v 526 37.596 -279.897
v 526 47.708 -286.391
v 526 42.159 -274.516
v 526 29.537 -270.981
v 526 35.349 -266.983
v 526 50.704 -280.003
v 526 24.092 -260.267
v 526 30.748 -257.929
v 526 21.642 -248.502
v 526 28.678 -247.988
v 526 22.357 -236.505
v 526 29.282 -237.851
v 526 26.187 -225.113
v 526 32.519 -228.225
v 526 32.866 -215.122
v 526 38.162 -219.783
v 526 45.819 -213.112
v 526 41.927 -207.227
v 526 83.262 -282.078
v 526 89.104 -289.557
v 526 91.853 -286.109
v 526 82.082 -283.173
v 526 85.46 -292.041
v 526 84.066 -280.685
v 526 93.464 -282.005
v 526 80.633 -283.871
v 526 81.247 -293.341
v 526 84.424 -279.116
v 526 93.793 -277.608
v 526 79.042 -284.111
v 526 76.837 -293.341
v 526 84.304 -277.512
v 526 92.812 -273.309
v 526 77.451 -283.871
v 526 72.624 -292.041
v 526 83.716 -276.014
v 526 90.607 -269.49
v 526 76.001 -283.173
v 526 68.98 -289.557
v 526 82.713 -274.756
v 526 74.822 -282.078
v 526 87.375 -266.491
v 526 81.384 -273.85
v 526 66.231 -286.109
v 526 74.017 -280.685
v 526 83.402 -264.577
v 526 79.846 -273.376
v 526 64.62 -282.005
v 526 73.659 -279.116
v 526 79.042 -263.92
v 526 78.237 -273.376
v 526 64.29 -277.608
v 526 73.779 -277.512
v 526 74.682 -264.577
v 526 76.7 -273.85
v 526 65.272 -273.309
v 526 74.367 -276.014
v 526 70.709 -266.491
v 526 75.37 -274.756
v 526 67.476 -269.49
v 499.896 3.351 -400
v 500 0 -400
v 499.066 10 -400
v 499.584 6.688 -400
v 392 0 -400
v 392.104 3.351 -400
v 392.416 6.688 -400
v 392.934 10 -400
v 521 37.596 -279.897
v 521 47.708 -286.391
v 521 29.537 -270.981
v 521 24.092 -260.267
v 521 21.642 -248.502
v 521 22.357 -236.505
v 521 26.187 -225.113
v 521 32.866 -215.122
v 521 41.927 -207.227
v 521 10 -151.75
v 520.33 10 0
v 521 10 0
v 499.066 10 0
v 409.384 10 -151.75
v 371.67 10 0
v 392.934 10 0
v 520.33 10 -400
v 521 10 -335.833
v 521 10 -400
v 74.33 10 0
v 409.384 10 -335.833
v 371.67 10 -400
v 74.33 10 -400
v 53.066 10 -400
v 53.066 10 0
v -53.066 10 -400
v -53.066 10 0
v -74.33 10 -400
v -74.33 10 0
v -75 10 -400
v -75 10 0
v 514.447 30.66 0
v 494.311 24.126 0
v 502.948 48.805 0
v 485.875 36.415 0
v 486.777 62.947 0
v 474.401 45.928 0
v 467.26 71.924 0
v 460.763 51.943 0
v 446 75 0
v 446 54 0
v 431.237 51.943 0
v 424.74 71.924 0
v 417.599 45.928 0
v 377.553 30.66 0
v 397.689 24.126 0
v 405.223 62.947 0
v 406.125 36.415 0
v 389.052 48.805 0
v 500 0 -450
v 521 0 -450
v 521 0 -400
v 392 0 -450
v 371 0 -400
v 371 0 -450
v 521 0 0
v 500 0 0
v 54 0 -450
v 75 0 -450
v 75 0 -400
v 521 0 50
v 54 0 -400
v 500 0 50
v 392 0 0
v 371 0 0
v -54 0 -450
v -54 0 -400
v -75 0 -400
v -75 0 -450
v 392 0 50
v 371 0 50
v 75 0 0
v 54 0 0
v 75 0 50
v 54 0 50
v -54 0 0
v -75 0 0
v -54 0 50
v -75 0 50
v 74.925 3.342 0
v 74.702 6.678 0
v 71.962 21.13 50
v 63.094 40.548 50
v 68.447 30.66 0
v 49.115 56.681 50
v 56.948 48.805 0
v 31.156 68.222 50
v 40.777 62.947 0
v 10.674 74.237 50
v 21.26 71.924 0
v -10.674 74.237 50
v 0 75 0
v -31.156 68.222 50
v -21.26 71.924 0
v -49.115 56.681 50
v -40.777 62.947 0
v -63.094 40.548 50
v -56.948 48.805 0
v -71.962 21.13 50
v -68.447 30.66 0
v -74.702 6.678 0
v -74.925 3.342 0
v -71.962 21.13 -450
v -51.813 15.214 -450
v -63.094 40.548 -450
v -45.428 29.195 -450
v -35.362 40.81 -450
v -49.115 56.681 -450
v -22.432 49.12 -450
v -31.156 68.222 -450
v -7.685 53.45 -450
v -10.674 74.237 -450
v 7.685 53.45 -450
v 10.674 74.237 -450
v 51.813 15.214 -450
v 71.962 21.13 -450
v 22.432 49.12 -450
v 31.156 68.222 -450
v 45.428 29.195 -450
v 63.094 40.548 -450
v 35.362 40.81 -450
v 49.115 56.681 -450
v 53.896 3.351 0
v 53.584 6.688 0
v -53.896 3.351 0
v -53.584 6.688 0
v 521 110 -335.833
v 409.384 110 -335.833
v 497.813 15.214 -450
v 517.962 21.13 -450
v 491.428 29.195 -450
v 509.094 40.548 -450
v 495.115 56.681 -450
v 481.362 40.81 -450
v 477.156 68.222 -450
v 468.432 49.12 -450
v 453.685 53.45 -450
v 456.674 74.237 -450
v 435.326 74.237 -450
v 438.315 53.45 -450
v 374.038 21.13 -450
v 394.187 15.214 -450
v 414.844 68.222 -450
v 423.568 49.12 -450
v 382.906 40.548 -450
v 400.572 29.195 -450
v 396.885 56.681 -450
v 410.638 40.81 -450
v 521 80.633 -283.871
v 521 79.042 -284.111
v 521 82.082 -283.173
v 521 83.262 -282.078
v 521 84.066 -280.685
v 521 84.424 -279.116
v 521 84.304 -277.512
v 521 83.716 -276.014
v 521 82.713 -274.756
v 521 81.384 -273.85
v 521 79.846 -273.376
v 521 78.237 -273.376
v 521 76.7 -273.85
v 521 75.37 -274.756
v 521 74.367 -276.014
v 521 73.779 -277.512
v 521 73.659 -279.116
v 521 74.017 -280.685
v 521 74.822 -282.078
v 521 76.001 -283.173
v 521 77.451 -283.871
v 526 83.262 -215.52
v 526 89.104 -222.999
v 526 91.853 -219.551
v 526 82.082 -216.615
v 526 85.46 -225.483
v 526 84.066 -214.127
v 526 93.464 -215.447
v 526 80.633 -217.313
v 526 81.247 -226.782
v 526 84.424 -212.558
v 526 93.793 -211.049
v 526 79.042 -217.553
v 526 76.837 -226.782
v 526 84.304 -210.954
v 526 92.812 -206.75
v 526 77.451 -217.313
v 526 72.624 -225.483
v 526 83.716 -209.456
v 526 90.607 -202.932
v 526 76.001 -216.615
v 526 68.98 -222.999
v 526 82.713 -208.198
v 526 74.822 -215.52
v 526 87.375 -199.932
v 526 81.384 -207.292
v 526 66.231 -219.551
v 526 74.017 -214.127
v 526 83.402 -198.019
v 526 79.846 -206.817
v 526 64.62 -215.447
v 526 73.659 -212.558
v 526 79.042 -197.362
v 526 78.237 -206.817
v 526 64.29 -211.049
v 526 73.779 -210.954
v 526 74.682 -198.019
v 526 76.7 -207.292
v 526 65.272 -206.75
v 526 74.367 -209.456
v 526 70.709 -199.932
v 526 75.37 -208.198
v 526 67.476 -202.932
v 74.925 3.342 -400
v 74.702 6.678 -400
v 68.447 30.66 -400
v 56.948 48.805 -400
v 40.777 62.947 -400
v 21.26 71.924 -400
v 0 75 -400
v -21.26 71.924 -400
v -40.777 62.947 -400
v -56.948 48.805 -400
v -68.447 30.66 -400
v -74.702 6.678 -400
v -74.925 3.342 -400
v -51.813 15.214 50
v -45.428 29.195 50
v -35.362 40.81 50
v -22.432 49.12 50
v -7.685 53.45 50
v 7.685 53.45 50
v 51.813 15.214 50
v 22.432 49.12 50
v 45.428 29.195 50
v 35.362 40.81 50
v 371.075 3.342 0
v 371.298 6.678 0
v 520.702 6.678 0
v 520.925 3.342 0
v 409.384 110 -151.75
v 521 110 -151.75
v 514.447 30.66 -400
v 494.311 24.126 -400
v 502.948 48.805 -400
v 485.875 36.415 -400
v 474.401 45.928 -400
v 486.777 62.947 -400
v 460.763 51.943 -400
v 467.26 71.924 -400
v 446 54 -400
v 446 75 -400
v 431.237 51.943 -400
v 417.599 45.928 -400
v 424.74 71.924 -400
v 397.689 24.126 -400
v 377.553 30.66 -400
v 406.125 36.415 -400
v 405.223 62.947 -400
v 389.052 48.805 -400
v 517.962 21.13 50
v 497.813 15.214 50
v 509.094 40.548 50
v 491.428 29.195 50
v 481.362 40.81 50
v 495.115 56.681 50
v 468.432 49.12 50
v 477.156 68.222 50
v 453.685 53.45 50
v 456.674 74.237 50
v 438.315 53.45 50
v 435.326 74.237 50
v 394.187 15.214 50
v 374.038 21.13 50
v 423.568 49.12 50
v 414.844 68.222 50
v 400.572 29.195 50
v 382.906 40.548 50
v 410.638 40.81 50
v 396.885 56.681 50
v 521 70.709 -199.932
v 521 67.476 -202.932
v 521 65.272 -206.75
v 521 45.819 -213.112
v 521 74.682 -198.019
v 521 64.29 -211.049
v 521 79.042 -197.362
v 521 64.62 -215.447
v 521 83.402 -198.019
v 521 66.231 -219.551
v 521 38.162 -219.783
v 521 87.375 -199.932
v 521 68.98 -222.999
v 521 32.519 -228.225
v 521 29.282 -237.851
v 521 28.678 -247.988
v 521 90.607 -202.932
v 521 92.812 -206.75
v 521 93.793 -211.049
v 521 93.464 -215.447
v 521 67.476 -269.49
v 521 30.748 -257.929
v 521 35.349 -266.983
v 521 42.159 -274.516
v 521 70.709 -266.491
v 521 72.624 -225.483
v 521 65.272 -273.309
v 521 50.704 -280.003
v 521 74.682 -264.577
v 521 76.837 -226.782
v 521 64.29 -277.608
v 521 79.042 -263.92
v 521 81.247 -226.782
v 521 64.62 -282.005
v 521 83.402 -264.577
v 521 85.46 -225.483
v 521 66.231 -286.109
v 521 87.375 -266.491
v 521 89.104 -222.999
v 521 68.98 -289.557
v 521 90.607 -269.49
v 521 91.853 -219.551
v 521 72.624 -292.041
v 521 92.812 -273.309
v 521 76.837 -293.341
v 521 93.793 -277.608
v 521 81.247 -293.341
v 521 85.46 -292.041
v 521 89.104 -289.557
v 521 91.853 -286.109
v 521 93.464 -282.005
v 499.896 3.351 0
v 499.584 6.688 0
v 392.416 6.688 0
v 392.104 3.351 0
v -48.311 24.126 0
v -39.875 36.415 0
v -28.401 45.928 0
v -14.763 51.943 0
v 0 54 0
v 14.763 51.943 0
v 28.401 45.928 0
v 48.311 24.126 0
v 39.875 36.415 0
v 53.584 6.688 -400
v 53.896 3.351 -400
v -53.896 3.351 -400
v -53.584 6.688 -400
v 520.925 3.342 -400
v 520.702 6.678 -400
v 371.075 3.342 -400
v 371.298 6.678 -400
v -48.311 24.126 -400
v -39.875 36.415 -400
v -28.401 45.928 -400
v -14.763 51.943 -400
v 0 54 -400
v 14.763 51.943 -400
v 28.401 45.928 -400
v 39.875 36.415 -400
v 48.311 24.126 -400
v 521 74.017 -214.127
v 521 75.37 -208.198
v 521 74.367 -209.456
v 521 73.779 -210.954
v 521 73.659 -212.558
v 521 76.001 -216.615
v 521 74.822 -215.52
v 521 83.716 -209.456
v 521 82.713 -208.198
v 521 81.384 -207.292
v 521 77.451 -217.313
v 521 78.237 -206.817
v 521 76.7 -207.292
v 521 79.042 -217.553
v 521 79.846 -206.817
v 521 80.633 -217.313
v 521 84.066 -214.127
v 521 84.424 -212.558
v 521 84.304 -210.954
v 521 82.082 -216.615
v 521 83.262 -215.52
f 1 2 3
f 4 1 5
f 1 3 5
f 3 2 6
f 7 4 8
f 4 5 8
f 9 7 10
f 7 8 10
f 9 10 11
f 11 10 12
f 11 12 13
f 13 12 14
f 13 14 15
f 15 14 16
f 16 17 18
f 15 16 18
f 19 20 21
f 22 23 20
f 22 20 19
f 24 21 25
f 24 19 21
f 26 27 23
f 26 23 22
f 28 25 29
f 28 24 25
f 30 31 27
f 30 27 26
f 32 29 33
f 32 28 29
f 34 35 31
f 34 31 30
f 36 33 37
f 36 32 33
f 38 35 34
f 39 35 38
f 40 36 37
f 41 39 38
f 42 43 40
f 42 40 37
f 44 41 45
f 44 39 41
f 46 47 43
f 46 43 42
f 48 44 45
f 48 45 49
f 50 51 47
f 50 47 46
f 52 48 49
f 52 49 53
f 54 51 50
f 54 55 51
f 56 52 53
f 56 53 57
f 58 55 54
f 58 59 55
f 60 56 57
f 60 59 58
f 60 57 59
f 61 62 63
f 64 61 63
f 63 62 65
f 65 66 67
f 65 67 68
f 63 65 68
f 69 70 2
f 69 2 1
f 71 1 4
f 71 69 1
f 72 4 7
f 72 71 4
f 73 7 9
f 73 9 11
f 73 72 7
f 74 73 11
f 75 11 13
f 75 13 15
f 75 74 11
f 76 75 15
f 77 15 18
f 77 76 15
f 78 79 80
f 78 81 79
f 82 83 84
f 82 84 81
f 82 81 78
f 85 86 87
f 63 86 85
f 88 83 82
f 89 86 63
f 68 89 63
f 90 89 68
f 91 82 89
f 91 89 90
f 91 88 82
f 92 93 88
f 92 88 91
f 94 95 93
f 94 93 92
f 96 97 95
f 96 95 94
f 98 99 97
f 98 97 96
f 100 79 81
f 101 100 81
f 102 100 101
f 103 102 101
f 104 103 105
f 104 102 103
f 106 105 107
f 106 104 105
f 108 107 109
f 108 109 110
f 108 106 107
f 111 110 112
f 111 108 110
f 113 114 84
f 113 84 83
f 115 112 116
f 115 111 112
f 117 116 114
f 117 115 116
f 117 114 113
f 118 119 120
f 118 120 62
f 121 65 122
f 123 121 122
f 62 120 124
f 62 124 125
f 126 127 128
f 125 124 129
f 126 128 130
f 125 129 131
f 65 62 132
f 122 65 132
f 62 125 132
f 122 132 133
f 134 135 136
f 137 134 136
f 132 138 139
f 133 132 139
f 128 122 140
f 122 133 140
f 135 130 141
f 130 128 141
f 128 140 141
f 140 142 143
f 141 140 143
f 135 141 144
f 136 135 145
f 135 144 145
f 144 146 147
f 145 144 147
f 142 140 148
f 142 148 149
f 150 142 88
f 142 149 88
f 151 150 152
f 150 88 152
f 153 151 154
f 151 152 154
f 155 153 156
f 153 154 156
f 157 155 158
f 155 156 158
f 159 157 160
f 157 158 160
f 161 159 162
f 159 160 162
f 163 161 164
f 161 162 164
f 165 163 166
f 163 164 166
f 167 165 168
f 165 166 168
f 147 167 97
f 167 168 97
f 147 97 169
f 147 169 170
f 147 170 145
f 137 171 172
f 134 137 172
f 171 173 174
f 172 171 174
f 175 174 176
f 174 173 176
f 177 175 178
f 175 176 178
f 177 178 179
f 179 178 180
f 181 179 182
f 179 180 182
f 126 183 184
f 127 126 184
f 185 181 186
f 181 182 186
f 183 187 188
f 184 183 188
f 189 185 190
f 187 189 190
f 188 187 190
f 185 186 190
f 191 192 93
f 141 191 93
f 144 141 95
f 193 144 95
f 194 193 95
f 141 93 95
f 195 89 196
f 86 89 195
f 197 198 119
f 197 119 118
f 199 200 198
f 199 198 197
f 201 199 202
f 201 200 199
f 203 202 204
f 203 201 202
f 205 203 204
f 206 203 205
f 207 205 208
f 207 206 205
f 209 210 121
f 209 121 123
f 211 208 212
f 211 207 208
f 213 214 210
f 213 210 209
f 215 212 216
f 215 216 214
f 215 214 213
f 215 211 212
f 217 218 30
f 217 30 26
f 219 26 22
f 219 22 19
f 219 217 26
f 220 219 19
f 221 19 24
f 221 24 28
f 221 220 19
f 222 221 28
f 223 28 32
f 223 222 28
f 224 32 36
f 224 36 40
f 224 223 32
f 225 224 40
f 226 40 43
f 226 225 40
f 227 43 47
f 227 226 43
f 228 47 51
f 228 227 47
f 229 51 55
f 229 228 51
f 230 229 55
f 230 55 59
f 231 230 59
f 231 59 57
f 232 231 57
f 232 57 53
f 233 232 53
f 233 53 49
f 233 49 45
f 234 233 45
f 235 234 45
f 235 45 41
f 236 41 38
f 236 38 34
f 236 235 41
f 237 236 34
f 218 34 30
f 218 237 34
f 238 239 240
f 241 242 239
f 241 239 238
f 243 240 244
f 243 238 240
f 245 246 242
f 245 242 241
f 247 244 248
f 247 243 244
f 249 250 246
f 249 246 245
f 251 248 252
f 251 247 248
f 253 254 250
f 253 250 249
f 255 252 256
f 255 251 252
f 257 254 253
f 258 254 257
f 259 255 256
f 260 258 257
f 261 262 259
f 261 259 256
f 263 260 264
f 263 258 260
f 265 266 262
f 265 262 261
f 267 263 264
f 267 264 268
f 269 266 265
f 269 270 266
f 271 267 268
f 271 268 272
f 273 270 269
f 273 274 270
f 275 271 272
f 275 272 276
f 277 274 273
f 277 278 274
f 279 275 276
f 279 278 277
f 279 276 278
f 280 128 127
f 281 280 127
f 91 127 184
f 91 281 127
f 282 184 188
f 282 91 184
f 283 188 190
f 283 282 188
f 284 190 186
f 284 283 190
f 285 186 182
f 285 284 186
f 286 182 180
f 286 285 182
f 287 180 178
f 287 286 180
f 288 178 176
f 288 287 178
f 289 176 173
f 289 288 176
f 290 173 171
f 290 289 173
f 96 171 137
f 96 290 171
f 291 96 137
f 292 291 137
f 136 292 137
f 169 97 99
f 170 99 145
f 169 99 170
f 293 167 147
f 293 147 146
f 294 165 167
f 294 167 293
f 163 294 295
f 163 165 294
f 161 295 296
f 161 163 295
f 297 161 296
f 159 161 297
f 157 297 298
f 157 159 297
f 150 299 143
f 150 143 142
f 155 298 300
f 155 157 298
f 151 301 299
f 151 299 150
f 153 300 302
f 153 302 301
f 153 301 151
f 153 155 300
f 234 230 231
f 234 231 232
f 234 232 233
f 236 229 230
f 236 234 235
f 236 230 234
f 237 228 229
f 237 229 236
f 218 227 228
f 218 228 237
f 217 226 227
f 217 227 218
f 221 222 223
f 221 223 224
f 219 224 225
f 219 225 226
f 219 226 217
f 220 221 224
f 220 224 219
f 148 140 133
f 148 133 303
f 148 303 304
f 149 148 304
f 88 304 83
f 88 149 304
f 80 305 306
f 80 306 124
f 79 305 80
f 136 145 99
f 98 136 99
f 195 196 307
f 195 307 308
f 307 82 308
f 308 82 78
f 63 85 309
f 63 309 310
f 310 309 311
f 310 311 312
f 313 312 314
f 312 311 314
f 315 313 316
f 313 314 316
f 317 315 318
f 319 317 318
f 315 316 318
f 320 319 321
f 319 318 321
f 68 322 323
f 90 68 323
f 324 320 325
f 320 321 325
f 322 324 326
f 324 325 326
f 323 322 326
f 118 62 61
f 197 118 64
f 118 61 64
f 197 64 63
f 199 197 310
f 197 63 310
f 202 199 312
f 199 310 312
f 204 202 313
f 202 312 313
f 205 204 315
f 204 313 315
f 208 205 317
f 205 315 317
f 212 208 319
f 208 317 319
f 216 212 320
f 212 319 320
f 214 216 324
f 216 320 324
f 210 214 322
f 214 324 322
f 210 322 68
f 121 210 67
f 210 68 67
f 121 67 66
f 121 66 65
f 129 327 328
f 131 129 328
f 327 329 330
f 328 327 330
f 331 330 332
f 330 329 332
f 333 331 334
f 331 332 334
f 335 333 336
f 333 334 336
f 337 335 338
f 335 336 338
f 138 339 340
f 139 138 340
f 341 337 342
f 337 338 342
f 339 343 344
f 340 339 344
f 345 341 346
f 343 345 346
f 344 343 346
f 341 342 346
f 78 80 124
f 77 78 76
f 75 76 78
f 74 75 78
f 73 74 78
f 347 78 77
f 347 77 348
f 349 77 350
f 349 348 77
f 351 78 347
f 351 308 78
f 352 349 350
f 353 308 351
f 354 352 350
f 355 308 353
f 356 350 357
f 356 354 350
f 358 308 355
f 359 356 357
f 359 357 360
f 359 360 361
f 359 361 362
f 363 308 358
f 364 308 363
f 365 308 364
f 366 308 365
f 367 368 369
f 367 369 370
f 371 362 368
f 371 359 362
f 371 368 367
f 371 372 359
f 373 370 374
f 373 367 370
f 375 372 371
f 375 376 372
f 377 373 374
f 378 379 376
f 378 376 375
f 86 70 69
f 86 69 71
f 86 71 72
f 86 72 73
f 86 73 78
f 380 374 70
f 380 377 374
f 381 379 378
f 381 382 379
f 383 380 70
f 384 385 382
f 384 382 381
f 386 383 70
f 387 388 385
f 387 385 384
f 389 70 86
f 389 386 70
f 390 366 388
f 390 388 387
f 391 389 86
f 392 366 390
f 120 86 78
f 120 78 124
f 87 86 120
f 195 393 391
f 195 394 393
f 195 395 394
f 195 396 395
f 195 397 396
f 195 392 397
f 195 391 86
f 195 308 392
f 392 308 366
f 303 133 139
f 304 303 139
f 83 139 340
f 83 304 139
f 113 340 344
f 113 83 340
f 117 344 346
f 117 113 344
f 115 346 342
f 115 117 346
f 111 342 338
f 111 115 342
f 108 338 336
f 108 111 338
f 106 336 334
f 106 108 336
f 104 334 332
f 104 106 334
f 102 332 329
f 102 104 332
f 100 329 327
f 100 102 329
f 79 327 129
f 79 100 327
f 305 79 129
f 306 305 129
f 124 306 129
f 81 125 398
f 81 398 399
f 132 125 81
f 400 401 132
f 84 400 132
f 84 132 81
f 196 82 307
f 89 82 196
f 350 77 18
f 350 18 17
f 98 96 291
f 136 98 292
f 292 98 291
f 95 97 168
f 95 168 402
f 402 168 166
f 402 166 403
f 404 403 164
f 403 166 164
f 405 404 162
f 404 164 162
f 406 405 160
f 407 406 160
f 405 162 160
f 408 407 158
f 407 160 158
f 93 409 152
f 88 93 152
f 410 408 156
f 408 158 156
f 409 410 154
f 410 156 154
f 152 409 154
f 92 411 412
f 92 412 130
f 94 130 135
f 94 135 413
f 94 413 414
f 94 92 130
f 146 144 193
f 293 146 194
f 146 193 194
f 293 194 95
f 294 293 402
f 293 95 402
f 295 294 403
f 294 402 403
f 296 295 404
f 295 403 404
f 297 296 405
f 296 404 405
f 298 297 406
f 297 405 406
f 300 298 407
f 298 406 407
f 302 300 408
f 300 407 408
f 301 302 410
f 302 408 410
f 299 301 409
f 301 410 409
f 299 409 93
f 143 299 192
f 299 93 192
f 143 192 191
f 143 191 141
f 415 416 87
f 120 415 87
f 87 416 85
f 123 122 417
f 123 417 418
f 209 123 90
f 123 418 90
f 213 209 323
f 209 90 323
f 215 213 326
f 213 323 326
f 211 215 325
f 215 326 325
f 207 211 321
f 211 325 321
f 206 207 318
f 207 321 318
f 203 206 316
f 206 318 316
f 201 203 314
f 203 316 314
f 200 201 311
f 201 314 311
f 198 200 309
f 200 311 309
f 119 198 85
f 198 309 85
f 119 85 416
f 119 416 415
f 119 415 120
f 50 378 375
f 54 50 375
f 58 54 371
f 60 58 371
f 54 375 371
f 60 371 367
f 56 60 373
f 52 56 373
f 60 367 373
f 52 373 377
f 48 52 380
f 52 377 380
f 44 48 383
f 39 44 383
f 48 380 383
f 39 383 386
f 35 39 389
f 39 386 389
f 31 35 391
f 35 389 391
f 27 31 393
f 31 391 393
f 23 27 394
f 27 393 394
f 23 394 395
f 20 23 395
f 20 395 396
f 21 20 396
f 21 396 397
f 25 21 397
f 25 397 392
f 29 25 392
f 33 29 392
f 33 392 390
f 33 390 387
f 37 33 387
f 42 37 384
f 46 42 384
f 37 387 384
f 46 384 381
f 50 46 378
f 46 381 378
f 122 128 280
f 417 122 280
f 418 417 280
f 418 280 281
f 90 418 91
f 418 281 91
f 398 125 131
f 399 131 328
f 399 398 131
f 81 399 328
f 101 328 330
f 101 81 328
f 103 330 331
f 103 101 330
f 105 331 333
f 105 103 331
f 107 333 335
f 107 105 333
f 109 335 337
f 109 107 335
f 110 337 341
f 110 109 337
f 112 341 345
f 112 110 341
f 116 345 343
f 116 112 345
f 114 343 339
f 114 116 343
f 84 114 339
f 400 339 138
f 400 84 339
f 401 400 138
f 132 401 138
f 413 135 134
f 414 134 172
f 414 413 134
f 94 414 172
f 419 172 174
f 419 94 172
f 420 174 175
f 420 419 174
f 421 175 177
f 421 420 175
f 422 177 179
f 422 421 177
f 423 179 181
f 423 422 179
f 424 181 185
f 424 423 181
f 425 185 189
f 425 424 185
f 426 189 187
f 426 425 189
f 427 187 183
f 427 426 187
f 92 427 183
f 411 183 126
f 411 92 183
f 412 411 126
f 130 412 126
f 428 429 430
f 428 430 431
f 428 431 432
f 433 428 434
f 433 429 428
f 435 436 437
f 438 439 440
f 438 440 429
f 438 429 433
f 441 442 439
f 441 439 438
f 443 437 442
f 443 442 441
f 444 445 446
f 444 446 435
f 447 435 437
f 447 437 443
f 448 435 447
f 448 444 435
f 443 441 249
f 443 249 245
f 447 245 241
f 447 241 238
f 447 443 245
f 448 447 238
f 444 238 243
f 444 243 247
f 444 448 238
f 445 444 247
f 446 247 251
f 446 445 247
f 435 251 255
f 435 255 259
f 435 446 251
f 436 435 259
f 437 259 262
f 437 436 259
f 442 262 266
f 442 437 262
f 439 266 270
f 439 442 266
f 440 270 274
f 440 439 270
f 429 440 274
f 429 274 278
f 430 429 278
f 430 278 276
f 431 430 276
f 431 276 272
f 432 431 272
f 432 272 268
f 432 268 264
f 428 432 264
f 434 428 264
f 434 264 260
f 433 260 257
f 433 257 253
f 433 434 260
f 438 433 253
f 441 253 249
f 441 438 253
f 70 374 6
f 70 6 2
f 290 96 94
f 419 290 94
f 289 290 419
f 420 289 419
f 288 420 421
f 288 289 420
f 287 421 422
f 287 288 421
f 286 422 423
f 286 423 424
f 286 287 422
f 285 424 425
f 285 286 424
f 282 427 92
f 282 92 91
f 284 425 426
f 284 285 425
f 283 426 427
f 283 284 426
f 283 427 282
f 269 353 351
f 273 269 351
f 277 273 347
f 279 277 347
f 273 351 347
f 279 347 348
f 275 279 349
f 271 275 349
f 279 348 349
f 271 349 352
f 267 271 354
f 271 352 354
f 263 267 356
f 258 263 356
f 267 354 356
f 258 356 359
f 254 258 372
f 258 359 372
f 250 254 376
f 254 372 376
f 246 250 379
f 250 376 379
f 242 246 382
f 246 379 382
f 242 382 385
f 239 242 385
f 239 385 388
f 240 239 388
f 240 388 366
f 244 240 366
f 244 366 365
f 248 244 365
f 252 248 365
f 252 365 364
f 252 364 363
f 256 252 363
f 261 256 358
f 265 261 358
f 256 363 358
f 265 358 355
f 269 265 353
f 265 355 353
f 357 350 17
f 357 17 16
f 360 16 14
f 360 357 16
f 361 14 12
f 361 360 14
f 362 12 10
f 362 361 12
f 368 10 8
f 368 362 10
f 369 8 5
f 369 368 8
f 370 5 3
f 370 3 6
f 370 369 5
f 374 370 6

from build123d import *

# Parameters (mm, degrees)
BOSS_EXTRUDE1_DEPTH  = 50
SKETCH2_W            = 150
SKETCH2_H            = 10
BOSS_EXTRUDE2_DEPTH  = 400
SKETCH3_W            = 400
SKETCH3_H            = 10
BOSS_EXTRUDE3_DEPTH  = 446
MIRROR2_COPY_1_DEPTH = 50
SKETCH4_W            = 111.615994823
SKETCH4_H            = 184.082968076
BOSS_EXTRUDE4_DEPTH  = 100
SKETCH5_R            = 14.792808223
SKETCH5_R_2          = 5.397690937
BOSS_EXTRUDE5_DEPTH  = 5


with BuildPart() as part:
    # Sketch1 → Boss-Extrude1 (new body)
    with BuildSketch(Plane.XY):
        with BuildLine():
            ThreePointArc((-54, 0), (0, 54), (54, 0))
            Line((54, 0), (75, 0))
            ThreePointArc((75, 0), (0, 75), (-75, 0))
            Line((-75, 0), (-54, 0))
        make_face()
    boss_extrude1 = extrude(amount=BOSS_EXTRUDE1_DEPTH)

    # Sketch2 → Boss-Extrude2 (add)
    with BuildSketch(Plane(origin=(0, 0, 0), x_dir=(-1, 0, 0), z_dir=(0, 0, -1))):
        with Locations((0, 5)):
            Rectangle(SKETCH2_W, SKETCH2_H)
    extrude(amount=BOSS_EXTRUDE2_DEPTH)

    # Mirror1: Boss-Extrude1 across plane
    add(boss_extrude1.mirror(Plane(origin=(0, 0, -200), x_dir=(1, 0, 0), z_dir=(0, 0, -1))))

    # Sketch3 → Boss-Extrude3 (add)
    with BuildSketch(Plane(origin=(75, 0, 0), x_dir=(0, 0, -1), z_dir=(1, 0, 0))):
        with Locations((200, 5)):
            Rectangle(SKETCH3_W, SKETCH3_H)
    extrude(amount=BOSS_EXTRUDE3_DEPTH)

    # Mirror2: Boss-Extrude1 across plane
    add(boss_extrude1.mirror(Plane.ZY.offset(-223)))

    # Mirror2 copy 1 sketch → Mirror2 copy 1 (add)
    with BuildSketch(Plane(origin=(446, 0, -400), x_dir=(-1, 0, 0), z_dir=(0, 0, -1))):
        with BuildLine():
            ThreePointArc((-54, 0), (0, 54), (54, 0))
            Line((54, 0), (75, 0))
            ThreePointArc((75, 0), (0, 75), (-75, 0))
            Line((-75, 0), (-54, 0))
        make_face()
    extrude(amount=MIRROR2_COPY_1_DEPTH)

    # Sketch4 → Boss-Extrude4 (add)
    with BuildSketch(Plane(origin=(0, 10, 0), x_dir=(1, 0, 0), z_dir=(0, 1, 0))):
        with Locations((465.192002589, 243.791802991)):
            Rectangle(SKETCH4_W, SKETCH4_H)
    extrude(amount=BOSS_EXTRUDE4_DEPTH)

    # Sketch5 → Boss-Extrude5 (add)
    # profile 1 of 3: a face of its own
    with BuildSketch(Plane(origin=(521, 0, 0), x_dir=(0, 0, -1), z_dir=(1, 0, 0))):
        with Locations(Location((212.154840545, 79.041859429, 0), (0, 0, 180))):
            Circle(SKETCH5_R)
        with Locations((212.154840545, 79.041859429)):
            Circle(SKETCH5_R_2, mode=Mode.SUBTRACT)
    # profile 2 of 3: a face of its own
    with BuildSketch(Plane(origin=(521, 0, 0), x_dir=(0, 0, -1), z_dir=(1, 0, 0))):
        with Locations(Location((278.712975673, 79.041859429, 0), (0, 0, 180))):
            Circle(SKETCH5_R)
        with Locations((278.712975673, 79.041859429)):
            Circle(SKETCH5_R_2, mode=Mode.SUBTRACT)
    # profile 3 of 3: a face of its own
    with BuildSketch(Plane(origin=(521, 0, 0), x_dir=(0, 0, -1), z_dir=(1, 0, 0))):
        with BuildLine():
            Line((280.00330423, 50.703730269), (286.391115278, 47.708316048))
            ThreePointArc((286.391115278, 47.708316048), (248.501595961, 21.641542626), (207.227203105, 41.927420598))
            Line((207.227203105, 41.927420598), (213.112092722, 45.819041152))
            ThreePointArc((213.112092722, 45.819041152), (247.987758497, 28.678062178), (280.00330423, 50.703730269))
        make_face()
    extrude(amount=BOSS_EXTRUDE5_DEPTH)


solid = part.part
